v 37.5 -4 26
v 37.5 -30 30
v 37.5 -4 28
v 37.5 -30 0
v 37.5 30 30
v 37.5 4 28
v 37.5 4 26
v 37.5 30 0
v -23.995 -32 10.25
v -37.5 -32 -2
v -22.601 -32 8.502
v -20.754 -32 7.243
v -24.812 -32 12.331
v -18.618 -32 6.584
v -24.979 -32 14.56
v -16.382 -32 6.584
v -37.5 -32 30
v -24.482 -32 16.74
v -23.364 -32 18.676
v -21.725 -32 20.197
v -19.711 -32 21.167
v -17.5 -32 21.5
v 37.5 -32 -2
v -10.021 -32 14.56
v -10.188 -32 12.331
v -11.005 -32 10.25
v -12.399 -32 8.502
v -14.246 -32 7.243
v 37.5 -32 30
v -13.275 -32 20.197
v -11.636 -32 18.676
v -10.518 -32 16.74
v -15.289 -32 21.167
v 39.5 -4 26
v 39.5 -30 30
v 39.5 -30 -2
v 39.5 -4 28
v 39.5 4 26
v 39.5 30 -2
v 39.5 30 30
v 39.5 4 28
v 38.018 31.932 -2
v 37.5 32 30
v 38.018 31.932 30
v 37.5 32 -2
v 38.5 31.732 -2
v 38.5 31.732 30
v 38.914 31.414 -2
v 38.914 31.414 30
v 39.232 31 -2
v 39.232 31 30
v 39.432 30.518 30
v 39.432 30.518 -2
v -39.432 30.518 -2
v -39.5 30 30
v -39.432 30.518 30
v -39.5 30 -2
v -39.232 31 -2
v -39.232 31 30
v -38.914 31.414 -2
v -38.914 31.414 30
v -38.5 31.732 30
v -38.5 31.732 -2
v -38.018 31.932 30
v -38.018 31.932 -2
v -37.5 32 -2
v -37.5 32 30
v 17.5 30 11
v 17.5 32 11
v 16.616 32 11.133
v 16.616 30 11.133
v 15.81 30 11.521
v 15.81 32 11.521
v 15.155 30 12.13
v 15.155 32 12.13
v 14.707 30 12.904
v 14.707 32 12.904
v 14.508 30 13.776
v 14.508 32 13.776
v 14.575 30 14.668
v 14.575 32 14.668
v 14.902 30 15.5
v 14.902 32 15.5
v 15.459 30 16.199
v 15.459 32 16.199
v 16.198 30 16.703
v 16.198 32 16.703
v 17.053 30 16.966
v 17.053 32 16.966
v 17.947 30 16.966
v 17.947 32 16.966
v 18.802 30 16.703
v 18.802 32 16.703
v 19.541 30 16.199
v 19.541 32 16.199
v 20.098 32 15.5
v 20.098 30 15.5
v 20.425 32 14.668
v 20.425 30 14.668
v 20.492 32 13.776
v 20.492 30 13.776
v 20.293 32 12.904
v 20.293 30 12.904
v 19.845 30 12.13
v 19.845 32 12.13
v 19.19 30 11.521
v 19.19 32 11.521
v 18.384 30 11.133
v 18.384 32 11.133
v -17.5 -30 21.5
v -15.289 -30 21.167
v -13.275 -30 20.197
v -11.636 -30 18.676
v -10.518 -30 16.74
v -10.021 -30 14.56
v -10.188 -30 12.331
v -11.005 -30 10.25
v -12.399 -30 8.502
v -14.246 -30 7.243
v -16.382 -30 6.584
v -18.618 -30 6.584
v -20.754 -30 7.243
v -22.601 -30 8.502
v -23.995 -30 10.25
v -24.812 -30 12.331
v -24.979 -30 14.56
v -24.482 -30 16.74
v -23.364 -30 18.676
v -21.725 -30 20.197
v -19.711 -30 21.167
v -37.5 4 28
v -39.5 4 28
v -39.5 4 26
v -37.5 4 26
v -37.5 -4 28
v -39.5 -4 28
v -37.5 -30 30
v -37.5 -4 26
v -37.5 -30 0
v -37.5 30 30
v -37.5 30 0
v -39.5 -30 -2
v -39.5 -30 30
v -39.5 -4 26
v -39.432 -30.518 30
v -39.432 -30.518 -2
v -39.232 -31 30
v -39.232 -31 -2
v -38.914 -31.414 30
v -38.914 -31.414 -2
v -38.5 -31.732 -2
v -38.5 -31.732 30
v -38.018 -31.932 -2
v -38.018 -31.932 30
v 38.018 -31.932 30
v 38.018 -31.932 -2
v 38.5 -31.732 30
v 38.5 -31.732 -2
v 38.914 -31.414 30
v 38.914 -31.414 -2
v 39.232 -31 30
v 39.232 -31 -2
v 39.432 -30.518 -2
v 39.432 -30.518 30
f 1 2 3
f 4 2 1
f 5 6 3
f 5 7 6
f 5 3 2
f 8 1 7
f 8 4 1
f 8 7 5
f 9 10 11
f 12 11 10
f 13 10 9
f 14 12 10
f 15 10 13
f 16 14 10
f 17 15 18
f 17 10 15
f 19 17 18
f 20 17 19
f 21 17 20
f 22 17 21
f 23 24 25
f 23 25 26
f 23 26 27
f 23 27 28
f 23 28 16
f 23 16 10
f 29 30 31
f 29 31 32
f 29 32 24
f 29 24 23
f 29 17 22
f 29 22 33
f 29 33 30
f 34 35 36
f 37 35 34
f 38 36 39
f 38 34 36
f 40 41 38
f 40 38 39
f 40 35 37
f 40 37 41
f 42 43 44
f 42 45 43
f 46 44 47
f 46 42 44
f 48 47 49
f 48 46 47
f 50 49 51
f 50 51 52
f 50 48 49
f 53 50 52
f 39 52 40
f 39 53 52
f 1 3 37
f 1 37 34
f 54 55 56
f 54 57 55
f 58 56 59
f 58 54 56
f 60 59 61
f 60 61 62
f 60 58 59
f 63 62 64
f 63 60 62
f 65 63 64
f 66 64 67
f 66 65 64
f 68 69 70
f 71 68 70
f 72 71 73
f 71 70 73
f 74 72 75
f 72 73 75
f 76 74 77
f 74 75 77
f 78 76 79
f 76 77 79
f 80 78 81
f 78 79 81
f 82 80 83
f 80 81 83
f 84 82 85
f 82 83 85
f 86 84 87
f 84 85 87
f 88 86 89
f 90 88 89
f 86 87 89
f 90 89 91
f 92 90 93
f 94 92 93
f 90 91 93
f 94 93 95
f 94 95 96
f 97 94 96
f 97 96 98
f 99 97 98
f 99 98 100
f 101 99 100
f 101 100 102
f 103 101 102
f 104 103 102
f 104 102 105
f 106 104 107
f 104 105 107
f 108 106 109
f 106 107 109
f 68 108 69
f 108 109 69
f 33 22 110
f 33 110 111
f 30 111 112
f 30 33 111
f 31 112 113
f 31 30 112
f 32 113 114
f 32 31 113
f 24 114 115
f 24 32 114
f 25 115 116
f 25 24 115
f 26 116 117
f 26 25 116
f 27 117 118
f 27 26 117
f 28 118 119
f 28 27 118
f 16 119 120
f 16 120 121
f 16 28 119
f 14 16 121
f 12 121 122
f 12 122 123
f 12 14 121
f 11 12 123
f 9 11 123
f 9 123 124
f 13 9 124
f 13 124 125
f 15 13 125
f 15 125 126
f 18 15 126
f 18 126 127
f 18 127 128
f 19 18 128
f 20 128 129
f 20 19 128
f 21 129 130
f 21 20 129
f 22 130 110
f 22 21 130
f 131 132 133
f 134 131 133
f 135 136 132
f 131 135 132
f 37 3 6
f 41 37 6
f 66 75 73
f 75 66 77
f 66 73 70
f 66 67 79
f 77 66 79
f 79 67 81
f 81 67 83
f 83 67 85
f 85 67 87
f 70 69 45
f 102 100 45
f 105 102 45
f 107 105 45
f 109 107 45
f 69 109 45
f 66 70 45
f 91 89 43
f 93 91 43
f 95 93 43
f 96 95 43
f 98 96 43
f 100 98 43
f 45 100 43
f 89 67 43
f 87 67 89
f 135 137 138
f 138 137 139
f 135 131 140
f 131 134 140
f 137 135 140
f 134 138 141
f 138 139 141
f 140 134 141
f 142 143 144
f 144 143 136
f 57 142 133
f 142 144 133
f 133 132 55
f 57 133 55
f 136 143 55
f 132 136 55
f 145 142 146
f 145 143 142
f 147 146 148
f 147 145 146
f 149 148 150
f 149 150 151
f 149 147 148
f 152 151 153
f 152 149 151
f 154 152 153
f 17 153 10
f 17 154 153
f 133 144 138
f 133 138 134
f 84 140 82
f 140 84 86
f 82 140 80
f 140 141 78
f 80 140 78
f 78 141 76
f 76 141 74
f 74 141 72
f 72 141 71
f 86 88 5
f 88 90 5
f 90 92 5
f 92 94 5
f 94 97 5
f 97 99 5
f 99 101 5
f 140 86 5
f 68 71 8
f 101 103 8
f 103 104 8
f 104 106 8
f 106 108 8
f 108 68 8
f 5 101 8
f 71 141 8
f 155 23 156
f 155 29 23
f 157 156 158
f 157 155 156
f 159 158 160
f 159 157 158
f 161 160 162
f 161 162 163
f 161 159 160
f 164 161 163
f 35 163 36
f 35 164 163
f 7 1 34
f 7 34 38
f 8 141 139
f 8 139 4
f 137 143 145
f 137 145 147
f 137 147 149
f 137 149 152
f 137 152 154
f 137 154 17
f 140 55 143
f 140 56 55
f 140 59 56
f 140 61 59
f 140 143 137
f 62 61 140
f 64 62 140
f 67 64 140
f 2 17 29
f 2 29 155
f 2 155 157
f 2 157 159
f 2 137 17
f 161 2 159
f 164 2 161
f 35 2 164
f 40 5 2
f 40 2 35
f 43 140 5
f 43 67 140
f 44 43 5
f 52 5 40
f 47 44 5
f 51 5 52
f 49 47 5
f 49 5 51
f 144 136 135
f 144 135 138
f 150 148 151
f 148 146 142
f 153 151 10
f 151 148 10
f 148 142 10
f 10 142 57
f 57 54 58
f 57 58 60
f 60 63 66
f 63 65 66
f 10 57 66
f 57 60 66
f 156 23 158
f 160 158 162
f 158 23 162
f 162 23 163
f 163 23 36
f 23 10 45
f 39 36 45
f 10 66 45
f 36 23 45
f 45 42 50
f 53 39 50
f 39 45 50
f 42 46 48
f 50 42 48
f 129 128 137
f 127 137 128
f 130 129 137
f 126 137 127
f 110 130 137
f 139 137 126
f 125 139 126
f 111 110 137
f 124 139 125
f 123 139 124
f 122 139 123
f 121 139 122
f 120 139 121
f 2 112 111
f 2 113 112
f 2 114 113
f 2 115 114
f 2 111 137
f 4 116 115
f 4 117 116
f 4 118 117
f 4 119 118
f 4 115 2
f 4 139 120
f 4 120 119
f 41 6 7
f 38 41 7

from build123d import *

# Parameters (mm, degrees)
SKETCH_218_W                = 79
SKETCH_218_H                = 64
SKETCH_218_W_2              = 75
SKETCH_218_H_2              = 60
EXTRUDE_371_DEPTH           = 30
SKETCH_3_W                  = 79
SKETCH_3_H                  = 64
SKETCH_3_W_2                = 75
SKETCH_3_H_2                = 60
EXTRUDE_416_DEPTH           = 2
CUT_EXTRUDE_START           = -32
SKETCH_3_2_R                = 7.5
CUT_EXTRUDE_880_DEPTH       = 2
CUT_EXTRUDE_START_2         = 32
SKETCH_3_3_R                = 3
CUT_EXTRUDE_941_DEPTH       = 2
CUT_EXTRUDE_1138_DEPTH      = 60.027535947
CUT_EXTRUDE_1138_DEPTH_BACK = 60.027535947
SKETCH_4_W                  = 2
SKETCH_4_H                  = 8
FILLET_1191_R               = 2


with BuildPart() as part:
    # Sketch 218 → Extrude 371 (new body)
    with BuildSketch(Plane.XY):
        Rectangle(SKETCH_218_W, SKETCH_218_H)
        Rectangle(SKETCH_218_W_2, SKETCH_218_H_2, mode=Mode.SUBTRACT)
    extrude(amount=EXTRUDE_371_DEPTH)

    # Sketch 3 → Extrude 416 (add)
    # profile 1 of 2: a face of its own
    with BuildSketch(Plane.XY):
        Rectangle(SKETCH_3_W, SKETCH_3_H)
        Rectangle(SKETCH_3_W_2, SKETCH_3_H_2, mode=Mode.SUBTRACT)
    # profile 2 of 2: a face of its own
    with BuildSketch(Plane.XY):
        Rectangle(SKETCH_3_W_2, SKETCH_3_H_2)
    extrude(amount=-EXTRUDE_416_DEPTH)

    # Sketch 3 2 → Cut-Extrude 880 (cut)
    with BuildSketch(Plane(origin=(0, 0, 0), x_dir=(1, 0, 0), z_dir=(0, 1, 0)).offset(CUT_EXTRUDE_START)):
        with Locations(Location((-17.5, -14, 0), (0, 0, 270))):
            Circle(SKETCH_3_2_R)
    extrude(amount=CUT_EXTRUDE_880_DEPTH, mode=Mode.SUBTRACT)

    # 草图3<3> → Cut-Extrude 941 (cut)
    with BuildSketch(Plane(origin=(0, 0, 0), x_dir=(1, 0, 0), z_dir=(0, 1, 0)).offset(CUT_EXTRUDE_START_2)):
        with Locations(Location((17.5, -14, 0), (0, 0, 90))):
            Circle(SKETCH_3_3_R)
    extrude(amount=-CUT_EXTRUDE_941_DEPTH, mode=Mode.SUBTRACT)

    # 草图4 → Cut-Extrude 1138 (cut, two sides: drawn at the far end of the back side and taken through both)
    with BuildSketch(Plane(origin=(0, 0, 0), x_dir=(0, 0, -1), z_dir=(1, 0, 0)).offset(-CUT_EXTRUDE_1138_DEPTH_BACK)):
        with Locations((-27, 0)):
            Rectangle(SKETCH_4_W, SKETCH_4_H)
    extrude(amount=CUT_EXTRUDE_1138_DEPTH + CUT_EXTRUDE_1138_DEPTH_BACK, mode=Mode.SUBTRACT)

    # Fillet 1191
    fillet_1191_edges = [part.edges().sort_by_distance(p)[0] for p in [
        (-39.5, -32, 14),
        (-39.5, 32, 14),
        (39.5, 32, 14),
        (39.5, -32, 14),
    ]]
    fillet(fillet_1191_edges, radius=FILLET_1191_R)


solid = part.part
